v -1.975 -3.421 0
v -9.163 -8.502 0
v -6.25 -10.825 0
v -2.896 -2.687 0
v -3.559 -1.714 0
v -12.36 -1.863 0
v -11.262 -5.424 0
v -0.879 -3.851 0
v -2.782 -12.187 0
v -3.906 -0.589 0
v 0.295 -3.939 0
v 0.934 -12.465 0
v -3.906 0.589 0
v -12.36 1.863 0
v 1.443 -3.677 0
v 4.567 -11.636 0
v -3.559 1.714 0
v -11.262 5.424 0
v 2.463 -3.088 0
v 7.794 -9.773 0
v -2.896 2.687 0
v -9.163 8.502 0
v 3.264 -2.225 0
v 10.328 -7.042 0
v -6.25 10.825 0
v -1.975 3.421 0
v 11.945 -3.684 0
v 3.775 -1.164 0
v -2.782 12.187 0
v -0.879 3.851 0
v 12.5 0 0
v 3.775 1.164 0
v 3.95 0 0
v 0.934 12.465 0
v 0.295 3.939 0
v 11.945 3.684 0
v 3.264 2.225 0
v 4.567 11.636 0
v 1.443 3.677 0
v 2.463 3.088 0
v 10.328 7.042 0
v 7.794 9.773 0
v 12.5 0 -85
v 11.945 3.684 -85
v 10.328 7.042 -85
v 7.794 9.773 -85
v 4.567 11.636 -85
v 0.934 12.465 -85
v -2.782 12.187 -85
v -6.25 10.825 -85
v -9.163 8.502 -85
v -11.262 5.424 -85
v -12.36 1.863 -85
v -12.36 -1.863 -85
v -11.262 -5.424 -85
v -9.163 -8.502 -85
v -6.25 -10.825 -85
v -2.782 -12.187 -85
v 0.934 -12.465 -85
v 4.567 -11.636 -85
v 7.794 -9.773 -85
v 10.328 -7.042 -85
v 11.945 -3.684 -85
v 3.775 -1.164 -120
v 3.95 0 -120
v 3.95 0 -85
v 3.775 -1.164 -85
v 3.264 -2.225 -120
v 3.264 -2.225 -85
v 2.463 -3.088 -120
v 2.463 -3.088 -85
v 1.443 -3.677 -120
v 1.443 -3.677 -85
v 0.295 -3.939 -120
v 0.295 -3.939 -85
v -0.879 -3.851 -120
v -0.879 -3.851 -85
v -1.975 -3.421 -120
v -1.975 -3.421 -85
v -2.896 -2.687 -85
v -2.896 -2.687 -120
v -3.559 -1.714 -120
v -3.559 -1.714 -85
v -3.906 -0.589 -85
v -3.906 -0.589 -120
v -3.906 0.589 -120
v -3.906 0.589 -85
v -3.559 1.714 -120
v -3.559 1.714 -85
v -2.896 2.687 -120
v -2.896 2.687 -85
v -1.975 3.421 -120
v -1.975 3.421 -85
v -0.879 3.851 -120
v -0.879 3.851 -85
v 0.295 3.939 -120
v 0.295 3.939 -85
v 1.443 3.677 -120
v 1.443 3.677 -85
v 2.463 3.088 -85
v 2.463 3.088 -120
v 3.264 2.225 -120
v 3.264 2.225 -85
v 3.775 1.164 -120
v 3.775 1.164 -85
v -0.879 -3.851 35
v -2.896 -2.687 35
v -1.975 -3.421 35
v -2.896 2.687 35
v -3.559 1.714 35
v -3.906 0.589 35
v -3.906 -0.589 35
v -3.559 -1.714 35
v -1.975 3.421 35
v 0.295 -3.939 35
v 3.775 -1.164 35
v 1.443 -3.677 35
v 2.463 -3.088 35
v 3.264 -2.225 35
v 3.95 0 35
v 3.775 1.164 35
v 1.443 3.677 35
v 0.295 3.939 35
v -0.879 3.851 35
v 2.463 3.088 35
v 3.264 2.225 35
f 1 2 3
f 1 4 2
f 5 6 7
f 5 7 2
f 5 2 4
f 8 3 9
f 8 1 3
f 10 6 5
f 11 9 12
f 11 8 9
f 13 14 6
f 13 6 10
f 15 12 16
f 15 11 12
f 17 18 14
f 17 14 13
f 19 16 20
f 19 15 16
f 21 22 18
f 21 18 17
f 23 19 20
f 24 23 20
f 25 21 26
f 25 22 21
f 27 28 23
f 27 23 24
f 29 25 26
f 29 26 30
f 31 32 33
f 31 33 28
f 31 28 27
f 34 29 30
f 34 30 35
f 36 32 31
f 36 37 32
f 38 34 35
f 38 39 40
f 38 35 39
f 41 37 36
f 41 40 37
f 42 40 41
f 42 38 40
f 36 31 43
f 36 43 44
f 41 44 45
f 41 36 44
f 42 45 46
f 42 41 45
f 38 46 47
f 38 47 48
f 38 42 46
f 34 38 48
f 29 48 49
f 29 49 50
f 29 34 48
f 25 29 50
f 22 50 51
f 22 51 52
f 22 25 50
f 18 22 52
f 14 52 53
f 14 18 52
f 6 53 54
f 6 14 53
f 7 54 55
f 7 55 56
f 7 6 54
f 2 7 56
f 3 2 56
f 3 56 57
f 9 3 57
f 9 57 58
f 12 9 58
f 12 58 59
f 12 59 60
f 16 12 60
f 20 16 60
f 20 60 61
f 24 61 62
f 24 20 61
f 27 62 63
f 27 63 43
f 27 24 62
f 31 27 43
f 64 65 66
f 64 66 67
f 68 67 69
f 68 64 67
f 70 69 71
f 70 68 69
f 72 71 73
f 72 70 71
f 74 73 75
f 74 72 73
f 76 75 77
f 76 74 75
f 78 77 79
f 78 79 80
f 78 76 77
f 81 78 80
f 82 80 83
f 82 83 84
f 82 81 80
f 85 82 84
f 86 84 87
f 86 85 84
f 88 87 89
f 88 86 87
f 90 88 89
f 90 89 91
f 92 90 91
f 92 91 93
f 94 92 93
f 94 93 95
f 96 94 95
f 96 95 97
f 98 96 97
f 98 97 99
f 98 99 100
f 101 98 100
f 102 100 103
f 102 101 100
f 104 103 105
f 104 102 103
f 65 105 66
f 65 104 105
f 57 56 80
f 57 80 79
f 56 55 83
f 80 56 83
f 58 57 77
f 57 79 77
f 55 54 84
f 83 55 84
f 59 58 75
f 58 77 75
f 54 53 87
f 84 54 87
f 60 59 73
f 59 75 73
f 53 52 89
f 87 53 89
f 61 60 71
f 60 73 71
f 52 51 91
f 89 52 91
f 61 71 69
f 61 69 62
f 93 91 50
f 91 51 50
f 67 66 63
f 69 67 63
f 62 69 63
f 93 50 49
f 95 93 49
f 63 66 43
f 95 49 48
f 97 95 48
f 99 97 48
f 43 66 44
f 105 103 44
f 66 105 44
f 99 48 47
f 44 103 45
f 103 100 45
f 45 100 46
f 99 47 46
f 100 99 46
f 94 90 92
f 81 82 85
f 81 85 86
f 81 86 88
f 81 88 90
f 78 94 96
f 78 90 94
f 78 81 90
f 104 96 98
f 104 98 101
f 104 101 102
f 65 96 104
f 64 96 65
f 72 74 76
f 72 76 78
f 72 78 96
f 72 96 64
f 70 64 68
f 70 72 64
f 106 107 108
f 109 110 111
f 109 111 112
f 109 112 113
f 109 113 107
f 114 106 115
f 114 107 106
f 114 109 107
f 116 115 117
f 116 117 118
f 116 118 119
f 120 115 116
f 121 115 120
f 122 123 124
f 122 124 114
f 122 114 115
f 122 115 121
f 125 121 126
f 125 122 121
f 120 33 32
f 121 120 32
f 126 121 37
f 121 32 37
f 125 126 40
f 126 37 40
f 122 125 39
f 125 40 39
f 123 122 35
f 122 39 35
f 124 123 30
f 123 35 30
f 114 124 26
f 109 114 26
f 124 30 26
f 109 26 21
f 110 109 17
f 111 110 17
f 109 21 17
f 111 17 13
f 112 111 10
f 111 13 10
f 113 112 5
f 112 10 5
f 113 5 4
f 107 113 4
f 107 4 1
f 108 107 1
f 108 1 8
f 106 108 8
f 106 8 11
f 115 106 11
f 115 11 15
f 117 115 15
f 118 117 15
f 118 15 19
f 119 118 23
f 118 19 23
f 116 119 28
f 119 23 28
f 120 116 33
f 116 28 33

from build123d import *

# Parameters (mm, degrees)
SKETCH1_R           = 12.5
BOSS_EXTRUDE1_DEPTH = 85
SKETCH2_R           = 3.95
BOSS_EXTRUDE2_DEPTH = 35
BOSS_EXTRUDE3_START = 35
SKETCH3_R           = 3.95
BOSS_EXTRUDE3_DEPTH = 35


with BuildPart() as part:
    # Sketch1 → Boss-Extrude1 (new body)
    with BuildSketch(Plane.XY):
        Circle(SKETCH1_R)
    extrude(amount=-BOSS_EXTRUDE1_DEPTH)

    # Sketch2 → Boss-Extrude2 (add)
    with BuildSketch(Plane.XY):
        Circle(SKETCH2_R)
    extrude(amount=BOSS_EXTRUDE2_DEPTH)

    # Sketch3 → Boss-Extrude3 (add)
    with BuildSketch(Plane(origin=(0, 0, -85), x_dir=(-1, 0, 0), z_dir=(0, 0, -1)).offset(BOSS_EXTRUDE3_START)):
        with Locations(Location((0, 0, 0), (0, 0, 180))):
            Circle(SKETCH3_R)
    extrude(amount=-BOSS_EXTRUDE3_DEPTH)


solid = part.part
